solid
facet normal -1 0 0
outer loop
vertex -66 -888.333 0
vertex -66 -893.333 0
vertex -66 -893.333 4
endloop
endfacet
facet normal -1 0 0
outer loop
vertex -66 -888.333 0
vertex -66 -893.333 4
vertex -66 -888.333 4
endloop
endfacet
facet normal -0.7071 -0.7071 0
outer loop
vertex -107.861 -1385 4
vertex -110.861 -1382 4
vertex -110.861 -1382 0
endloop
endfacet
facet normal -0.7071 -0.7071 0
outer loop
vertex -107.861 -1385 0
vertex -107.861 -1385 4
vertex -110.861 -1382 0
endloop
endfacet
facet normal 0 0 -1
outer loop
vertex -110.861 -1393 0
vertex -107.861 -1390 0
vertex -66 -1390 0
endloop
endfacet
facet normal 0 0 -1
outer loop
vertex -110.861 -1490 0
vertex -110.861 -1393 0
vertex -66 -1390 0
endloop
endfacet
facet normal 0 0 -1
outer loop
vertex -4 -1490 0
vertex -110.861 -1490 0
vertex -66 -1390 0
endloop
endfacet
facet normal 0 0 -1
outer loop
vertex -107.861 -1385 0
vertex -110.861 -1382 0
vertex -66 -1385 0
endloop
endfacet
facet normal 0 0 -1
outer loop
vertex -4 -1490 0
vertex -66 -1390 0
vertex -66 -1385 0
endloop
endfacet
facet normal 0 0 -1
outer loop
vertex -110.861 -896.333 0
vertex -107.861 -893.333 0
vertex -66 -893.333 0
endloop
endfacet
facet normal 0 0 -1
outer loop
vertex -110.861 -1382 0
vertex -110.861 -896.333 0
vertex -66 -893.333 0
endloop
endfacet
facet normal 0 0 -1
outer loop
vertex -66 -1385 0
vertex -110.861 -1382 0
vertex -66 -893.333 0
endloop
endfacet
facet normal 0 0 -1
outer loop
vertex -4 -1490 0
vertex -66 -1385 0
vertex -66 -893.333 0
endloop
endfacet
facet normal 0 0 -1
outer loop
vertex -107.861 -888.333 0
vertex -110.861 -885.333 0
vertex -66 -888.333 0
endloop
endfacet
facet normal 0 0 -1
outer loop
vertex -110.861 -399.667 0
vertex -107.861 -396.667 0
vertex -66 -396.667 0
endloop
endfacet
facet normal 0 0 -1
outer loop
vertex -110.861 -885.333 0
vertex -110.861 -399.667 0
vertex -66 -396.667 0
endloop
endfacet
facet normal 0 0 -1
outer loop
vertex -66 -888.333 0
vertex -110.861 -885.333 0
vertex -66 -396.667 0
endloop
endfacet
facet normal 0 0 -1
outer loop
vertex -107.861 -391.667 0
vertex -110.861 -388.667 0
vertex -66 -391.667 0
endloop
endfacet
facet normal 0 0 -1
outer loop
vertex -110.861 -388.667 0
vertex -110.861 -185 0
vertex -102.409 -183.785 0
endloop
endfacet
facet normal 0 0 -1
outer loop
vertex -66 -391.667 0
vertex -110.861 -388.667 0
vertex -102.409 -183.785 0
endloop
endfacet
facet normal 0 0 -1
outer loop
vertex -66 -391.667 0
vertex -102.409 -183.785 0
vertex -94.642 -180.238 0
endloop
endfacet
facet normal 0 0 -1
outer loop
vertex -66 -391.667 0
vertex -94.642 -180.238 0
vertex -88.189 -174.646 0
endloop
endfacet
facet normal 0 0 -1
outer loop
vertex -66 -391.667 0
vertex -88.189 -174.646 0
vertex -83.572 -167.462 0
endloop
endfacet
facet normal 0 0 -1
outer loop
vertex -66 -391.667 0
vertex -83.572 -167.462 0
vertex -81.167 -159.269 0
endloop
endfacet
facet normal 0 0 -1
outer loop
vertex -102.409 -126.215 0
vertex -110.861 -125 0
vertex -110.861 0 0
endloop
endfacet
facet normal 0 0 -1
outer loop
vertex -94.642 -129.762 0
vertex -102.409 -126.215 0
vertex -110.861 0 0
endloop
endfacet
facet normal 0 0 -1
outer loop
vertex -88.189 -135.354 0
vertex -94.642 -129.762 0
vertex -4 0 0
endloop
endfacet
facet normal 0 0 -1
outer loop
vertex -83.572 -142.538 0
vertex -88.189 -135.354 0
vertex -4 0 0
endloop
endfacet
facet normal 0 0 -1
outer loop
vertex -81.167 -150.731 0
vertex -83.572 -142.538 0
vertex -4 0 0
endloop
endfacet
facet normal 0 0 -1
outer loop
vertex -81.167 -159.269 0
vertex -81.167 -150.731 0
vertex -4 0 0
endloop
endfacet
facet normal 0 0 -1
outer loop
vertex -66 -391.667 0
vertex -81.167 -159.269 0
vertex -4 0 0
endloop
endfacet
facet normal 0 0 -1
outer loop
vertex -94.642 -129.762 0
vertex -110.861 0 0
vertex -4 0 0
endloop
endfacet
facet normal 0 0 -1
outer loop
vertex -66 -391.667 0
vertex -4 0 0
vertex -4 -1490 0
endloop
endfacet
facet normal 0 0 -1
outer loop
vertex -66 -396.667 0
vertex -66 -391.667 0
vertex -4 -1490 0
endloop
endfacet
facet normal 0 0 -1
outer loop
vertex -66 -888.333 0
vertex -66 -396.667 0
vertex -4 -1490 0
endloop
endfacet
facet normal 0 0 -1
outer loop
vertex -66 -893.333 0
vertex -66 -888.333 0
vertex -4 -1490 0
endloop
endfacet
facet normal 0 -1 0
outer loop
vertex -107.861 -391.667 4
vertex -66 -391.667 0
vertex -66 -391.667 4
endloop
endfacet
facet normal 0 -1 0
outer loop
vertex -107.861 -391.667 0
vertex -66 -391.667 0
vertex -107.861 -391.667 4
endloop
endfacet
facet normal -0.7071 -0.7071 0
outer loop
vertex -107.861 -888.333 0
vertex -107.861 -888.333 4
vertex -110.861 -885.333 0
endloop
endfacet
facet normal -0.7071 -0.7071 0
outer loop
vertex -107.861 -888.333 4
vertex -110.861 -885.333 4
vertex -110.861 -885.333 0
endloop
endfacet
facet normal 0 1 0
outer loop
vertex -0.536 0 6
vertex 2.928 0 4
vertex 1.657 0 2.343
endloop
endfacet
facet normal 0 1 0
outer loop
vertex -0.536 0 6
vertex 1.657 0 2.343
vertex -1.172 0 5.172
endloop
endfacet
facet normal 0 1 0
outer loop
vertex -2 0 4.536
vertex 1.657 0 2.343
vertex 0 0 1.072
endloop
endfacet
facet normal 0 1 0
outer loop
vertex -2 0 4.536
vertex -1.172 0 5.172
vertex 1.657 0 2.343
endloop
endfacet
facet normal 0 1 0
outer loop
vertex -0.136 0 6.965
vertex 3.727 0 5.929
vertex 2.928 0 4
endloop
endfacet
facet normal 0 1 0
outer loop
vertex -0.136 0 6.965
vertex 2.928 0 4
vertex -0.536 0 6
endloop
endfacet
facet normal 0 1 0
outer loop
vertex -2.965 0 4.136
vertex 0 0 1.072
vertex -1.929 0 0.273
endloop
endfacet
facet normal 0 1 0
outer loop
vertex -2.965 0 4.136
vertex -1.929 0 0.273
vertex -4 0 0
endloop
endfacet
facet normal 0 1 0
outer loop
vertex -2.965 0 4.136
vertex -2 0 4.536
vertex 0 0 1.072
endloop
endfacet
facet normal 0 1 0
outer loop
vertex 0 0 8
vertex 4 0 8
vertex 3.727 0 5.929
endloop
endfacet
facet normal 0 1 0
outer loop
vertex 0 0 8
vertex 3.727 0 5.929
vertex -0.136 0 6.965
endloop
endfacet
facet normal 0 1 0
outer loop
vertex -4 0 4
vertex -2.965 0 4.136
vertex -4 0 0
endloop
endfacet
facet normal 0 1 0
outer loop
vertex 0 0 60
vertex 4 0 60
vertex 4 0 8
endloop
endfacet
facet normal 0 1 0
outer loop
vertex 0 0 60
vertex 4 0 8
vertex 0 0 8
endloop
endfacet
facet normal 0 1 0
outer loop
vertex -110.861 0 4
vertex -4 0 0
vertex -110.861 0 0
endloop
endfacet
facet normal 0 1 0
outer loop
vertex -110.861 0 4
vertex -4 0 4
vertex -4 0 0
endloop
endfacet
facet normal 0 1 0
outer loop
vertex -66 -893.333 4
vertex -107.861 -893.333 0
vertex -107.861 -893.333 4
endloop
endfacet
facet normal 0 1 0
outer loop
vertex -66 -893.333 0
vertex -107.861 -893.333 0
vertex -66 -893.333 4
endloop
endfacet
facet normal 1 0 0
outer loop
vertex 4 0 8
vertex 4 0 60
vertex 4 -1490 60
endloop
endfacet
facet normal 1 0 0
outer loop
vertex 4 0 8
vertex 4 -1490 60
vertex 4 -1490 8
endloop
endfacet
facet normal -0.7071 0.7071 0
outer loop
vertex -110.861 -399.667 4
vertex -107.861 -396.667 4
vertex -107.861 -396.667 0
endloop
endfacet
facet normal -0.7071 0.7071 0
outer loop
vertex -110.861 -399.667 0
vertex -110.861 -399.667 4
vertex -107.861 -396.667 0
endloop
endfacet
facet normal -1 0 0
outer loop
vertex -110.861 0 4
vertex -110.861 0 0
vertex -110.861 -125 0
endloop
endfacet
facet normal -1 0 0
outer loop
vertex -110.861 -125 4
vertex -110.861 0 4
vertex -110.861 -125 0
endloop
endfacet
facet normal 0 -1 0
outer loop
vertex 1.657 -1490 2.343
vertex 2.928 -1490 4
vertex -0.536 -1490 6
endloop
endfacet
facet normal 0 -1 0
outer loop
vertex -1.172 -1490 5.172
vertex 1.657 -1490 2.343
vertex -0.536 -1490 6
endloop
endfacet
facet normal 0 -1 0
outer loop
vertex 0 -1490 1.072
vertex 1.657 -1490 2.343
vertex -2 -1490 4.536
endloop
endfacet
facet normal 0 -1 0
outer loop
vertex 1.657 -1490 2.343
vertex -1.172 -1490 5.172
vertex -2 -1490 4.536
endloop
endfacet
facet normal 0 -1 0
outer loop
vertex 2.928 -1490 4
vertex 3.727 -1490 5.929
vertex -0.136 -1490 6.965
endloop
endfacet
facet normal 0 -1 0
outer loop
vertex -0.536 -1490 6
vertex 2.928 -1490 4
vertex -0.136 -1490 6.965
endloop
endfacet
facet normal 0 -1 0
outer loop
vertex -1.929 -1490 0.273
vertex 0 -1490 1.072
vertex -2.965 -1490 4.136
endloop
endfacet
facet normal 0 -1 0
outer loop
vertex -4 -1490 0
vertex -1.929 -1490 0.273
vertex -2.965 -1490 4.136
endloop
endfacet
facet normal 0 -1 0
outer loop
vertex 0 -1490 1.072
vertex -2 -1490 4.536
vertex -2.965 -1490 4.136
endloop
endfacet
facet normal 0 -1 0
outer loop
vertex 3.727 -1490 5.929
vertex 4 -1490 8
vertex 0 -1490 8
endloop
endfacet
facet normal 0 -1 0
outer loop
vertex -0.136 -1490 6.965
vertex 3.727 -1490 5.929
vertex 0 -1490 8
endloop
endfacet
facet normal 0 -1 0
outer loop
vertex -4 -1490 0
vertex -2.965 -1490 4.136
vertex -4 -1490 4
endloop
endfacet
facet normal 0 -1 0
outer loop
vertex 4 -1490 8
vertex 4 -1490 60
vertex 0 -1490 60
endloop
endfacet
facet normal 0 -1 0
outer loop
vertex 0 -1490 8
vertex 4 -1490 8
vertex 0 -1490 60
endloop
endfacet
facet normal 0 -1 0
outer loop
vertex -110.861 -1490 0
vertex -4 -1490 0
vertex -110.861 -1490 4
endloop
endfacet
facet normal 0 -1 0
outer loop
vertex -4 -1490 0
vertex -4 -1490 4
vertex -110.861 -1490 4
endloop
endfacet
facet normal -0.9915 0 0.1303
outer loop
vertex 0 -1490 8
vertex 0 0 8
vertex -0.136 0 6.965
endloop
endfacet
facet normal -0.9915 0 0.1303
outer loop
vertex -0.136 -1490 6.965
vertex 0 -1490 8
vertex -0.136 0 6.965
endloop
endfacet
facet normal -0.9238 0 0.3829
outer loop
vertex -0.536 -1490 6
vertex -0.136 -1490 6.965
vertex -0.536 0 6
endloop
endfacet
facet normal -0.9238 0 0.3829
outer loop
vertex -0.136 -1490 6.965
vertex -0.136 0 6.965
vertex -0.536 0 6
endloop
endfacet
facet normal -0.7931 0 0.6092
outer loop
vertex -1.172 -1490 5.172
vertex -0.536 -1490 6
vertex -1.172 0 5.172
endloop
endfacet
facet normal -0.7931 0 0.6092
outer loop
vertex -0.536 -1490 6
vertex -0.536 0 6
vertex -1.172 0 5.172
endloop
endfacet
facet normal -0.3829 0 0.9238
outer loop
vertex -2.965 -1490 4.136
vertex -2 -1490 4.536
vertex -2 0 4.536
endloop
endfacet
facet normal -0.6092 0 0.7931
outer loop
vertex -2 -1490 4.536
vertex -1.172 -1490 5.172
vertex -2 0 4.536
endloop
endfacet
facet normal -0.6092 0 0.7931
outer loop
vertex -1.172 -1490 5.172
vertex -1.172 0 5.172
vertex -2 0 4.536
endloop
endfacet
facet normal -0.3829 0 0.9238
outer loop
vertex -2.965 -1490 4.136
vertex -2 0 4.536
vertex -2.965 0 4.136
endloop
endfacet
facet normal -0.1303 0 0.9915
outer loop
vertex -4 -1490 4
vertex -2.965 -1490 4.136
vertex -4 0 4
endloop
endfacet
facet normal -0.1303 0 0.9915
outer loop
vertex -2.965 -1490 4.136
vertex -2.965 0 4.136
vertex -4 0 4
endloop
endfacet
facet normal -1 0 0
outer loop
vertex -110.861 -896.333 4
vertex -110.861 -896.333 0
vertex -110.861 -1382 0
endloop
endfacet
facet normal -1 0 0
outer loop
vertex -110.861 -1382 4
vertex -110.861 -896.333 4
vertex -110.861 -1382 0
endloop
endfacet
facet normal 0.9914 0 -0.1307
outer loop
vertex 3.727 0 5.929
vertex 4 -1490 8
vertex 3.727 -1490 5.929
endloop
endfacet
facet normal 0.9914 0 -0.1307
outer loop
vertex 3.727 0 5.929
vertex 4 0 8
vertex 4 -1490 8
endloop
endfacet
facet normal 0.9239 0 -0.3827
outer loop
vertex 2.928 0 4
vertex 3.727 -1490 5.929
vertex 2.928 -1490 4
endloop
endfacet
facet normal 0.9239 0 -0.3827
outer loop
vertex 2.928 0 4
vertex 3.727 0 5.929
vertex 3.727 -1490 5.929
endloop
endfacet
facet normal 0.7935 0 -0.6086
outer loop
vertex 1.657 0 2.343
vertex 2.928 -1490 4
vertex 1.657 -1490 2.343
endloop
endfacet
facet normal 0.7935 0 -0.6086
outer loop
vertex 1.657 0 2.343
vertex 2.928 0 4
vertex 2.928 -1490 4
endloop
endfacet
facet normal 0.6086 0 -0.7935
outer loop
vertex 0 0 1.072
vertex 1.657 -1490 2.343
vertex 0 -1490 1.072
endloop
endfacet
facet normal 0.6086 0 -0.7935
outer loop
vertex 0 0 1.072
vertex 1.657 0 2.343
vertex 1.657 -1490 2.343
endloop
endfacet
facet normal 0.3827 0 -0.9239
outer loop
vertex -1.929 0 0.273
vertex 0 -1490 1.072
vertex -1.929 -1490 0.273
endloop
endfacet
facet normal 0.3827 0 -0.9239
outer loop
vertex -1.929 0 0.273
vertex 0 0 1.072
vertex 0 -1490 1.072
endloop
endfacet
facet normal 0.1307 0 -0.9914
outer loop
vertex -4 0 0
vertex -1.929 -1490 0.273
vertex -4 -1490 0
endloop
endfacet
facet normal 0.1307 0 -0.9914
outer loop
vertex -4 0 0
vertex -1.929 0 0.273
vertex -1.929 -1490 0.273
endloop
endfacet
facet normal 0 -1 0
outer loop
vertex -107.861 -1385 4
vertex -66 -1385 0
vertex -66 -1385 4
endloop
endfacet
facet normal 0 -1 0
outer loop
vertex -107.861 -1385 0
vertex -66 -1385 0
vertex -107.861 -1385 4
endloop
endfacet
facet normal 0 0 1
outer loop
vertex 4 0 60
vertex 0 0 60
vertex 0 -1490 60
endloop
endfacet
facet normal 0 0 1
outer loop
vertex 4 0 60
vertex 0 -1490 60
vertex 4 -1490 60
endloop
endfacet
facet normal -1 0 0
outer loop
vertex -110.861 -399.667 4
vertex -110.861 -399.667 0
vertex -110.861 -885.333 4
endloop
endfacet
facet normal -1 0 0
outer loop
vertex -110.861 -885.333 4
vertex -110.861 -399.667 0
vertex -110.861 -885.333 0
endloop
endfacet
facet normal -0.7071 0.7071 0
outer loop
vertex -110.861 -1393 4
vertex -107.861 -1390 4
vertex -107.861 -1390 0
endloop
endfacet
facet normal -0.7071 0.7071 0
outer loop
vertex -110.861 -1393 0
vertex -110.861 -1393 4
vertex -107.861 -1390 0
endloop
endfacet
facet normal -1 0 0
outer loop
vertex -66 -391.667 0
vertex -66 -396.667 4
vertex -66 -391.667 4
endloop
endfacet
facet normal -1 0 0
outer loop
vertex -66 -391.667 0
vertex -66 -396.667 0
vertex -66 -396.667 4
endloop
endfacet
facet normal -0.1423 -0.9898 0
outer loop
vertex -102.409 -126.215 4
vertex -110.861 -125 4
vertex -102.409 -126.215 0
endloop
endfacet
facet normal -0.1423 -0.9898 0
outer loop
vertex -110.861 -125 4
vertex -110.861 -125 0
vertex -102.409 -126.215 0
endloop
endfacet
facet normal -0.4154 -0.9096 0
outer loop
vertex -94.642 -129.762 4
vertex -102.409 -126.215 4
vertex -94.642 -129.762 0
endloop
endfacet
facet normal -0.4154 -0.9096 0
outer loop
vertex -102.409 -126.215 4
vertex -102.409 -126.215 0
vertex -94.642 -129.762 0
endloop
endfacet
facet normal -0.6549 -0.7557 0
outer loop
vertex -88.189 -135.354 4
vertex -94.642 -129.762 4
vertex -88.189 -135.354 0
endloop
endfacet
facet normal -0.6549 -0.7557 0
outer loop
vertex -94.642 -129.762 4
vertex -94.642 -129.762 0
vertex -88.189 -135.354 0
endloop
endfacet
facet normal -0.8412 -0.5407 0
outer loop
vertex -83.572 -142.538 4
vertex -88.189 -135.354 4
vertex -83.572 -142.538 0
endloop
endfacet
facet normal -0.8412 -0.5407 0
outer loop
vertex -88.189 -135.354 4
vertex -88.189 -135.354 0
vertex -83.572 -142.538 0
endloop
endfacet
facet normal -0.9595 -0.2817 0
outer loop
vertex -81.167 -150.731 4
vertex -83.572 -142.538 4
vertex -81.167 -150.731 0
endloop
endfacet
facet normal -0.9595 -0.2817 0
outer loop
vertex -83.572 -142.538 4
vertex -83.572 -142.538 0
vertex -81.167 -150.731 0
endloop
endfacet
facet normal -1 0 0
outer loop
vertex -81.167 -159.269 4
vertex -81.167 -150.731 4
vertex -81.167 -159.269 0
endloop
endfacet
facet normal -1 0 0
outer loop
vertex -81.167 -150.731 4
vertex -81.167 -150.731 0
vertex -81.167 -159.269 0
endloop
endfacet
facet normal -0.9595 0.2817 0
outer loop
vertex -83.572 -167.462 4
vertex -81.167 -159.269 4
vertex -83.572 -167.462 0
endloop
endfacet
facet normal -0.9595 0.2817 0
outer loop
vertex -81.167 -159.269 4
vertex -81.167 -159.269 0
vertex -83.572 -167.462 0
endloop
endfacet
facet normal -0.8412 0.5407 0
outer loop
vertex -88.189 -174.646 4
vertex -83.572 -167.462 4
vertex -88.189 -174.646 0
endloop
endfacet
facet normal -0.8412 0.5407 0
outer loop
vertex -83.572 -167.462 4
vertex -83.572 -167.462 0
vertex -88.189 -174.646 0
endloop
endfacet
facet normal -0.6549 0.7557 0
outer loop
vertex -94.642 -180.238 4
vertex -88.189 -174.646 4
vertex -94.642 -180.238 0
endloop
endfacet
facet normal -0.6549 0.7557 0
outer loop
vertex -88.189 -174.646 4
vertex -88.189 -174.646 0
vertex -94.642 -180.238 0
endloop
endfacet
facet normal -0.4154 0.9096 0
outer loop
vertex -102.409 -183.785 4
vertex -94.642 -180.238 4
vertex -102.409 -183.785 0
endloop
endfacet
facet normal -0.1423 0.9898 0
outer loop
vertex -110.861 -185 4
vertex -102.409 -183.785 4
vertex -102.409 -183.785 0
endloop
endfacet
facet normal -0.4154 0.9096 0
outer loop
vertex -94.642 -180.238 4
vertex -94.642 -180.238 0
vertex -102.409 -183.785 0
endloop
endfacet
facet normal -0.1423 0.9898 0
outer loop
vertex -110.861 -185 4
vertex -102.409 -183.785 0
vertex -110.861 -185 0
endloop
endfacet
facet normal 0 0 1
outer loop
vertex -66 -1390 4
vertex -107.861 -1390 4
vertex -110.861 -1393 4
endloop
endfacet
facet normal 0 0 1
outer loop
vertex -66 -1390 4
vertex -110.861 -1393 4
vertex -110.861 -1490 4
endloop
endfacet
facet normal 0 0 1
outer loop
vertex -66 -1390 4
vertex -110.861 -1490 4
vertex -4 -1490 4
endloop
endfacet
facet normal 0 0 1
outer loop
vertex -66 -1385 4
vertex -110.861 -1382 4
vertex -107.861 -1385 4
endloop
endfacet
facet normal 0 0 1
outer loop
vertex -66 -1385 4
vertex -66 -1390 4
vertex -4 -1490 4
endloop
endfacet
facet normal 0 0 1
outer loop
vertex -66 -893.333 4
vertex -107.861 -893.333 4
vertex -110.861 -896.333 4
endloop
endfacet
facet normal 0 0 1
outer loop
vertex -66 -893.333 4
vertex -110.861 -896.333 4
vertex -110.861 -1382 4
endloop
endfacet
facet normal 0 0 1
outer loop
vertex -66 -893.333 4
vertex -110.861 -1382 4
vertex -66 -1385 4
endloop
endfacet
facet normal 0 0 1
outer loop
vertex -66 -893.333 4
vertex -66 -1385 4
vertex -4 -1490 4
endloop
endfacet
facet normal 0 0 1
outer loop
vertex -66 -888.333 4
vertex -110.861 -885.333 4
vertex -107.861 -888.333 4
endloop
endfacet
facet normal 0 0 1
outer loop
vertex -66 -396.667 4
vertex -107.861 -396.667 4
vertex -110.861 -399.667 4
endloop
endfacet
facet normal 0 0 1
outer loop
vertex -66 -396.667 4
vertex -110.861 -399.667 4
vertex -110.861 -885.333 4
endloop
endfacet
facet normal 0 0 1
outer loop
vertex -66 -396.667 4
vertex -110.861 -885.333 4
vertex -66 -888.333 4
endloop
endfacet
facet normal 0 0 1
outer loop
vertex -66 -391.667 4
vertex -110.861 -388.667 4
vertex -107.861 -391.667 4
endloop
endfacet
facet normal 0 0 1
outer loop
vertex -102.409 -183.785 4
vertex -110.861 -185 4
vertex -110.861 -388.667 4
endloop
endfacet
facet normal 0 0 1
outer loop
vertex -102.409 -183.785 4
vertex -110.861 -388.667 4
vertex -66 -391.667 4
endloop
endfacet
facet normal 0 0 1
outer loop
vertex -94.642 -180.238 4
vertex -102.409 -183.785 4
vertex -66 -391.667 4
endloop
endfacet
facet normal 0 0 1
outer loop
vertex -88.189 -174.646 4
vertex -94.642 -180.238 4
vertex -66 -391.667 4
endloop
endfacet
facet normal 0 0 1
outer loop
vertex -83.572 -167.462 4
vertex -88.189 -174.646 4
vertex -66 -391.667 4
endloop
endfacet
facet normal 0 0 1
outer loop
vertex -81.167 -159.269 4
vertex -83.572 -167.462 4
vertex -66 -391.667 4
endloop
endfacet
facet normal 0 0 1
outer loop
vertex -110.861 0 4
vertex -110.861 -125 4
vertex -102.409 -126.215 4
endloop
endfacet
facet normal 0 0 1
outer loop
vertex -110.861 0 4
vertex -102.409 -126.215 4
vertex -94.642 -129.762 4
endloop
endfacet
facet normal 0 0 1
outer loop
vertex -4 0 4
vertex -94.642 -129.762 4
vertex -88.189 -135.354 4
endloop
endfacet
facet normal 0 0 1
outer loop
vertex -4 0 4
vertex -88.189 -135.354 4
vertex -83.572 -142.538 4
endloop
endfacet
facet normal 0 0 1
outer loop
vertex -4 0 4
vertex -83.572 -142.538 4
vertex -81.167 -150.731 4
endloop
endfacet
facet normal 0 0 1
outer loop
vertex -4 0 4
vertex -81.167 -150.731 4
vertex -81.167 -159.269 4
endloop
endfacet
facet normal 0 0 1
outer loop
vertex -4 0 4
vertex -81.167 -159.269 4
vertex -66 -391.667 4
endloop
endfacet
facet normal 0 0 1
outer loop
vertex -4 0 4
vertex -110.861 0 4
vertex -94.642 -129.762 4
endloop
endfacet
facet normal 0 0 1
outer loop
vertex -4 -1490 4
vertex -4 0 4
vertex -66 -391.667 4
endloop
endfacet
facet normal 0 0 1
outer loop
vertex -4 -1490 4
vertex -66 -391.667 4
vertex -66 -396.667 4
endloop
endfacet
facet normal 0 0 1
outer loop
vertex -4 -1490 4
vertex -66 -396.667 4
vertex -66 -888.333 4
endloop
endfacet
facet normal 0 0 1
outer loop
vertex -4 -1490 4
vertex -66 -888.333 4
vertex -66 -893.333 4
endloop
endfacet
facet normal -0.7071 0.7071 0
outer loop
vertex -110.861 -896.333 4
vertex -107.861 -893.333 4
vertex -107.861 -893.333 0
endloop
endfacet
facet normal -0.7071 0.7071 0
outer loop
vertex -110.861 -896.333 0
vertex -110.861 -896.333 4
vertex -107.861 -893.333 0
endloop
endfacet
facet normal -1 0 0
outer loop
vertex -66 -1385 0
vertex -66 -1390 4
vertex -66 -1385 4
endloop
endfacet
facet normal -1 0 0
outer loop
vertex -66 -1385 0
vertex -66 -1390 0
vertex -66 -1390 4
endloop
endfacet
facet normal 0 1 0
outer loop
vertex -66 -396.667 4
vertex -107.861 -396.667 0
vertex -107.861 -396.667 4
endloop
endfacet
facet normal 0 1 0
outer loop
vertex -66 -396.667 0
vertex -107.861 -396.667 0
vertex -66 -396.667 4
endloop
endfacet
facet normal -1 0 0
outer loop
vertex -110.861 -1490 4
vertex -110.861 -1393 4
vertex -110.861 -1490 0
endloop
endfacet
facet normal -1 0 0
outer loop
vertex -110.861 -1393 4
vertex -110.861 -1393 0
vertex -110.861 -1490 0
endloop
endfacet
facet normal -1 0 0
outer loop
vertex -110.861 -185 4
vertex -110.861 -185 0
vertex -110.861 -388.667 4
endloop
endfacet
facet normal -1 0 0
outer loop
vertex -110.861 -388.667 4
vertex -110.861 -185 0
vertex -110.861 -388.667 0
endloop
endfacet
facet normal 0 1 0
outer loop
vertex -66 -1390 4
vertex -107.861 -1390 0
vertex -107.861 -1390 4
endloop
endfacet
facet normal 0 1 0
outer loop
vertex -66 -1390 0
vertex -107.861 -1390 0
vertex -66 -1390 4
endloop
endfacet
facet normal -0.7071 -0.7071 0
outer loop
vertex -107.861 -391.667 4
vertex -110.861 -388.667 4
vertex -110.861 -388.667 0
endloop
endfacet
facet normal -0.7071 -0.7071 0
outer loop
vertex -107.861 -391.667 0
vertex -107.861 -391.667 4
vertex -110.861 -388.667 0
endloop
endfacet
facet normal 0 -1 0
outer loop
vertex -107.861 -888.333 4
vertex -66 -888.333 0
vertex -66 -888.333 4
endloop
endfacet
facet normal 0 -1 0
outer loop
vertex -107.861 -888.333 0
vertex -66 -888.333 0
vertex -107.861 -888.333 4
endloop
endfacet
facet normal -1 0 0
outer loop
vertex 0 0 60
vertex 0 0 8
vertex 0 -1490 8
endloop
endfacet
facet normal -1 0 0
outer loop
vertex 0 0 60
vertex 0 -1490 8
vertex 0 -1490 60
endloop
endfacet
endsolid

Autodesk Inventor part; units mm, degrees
ref_plane "YZ Plane" through (0, 0, 0) normal (1, 0, 0) x (0, 1, 0)
ref_plane "XZ Plane" through (0, 0, 0) normal (0, 1, 0) x (-1, 0, 0)
ref_plane "XY Plane" through (0, 0, 0) normal (0, 0, 1) x (1, 0, 0)
sketch "Sketch1" plane through (0, 0, 0) normal (0, 0, 1) x (1, 0, 0)
  line L0 (0, 0) -> (-110.8614, 0)
  line L1 (-110.8614, 0) -> (-110.8614, -1490)
  line L2 (-110.8614, -1490) -> (0, -1490)
  line L3 (0, -1490) -> (0, 0)
  line L4 (-110.8614, -1390) -> (-66, -1390)
  line L5 (-66, -1390) -> (-66, -1385)
  line L6 (-66, -1385) -> (-110.8614, -1385)
  line L7 (-110.8614, -1385) -> (-110.8614, -1390)
  line L8 (-110.8614, -893.3333) -> (-66, -893.3333)
  line L9 (-66, -893.3333) -> (-66, -888.3333)
  line L10 (-66, -888.3333) -> (-110.8614, -888.3333)
  line L11 (-110.8614, -888.3333) -> (-110.8614, -893.3333)
  line L12 (-110.8614, -396.6667) -> (-66, -396.6667)
  line L13 (-66, -396.6667) -> (-66, -391.6667)
  line L14 (-66, -391.6667) -> (-110.8614, -391.6667)
  line L15 (-110.8614, -391.6667) -> (-110.8614, -396.6667)
  circle A0 centre (-110.8614, -155) radius 30
  point P0 (-110.8614, -1385)
  point P1 (-110.8614, -125)
  point P2 (-110.8614, -185)
  dimension "d0" = 1490
  dimension "d1" = 110.8614
  dimension "d2" = 5
  dimension "d4" = 100
  dimension "d7" = 496.6667
  dimension "d23" = 66
  dimension "d28" = 60
  dimension "d29" = 1335
extrude "Plate1" add sketch "Sketch1" along normal blind 4 contours L3 L2 L1 L4 L5 L6 L8 L9 L10 L12 L13 L14 A0 L0
sketch "Sketch2" plane through (4, 0, 0) normal (-1, 0, 0) x (0, -1, 0)
  line L0 (1490, 0) -> (0, 0)
  line L1 (0, 0) -> (0, 60)
  line L2 (0, 60) -> (1490, 60)
  line L3 (1490, 60) -> (1490, 0)
edge flange "Flange1" height 60 angle 90 thickness 4 bend radius 4 thickness toward (-1, 0, 0) relief tear relief width 4 relief depth 2 edges at (0, -745, 4) wall of the first edge with corners at (4, -1490, 0) (4, 0, 0) (4, 0, 60) (4, -1490, 60)
bend "Bend1"
corner "Corner1"
chamfer "Corner Chamfer1" distance 3 angle 45 6 edges at (-110.8614, -1390, 2) (-110.8614, -1385, 2) (-110.8614, -893.3333, 2) (-110.8614, -888.3333, 2) (-110.8614, -391.6667, 2) (-110.8614, -396.6667, 2)
equation "\"d0\" = Стрингер_длина"
equation "\"d1\" = стрингер_глубина_8"
equation "\"d2\" = паз_под_стрингер_толщина"
equation "\"d7\" = 0.333333 * Стрингер_длина"
equation "\"d23\" = паз_под_стрингер_глубина - Thickness"
equation "\"d28\" = 2 * радиус_выреза_под_сварку"
equation "\"d12\" = Thickness"
equation "\"d13\" = BendReliefWidth"
equation "\"d14\" = BendReliefDepth"
equation "\"d15\" = MinimumRemnant"
equation "\"d16\" = TransitionRadius"
equation "\"d17\" = ребро_усилителей"
equation "\"d19\" = BendRadius"
equation "\"d20\" = CornerReliefSize"
equation "\"d21\" = GapSize"
equation "\"d22\" = JacobiRadiusSize"
equation "\"BendRadius\" = Thickness"
equation "\"BendReliefWidth\" = Thickness"
equation "\"BendReliefDepth\" = 0.5 * Thickness"
equation "\"CornerReliefSize\" = 4 * Thickness"
equation "\"MinimumRemnant\" = 2 * Thickness"
equation "\"TransitionRadius\" = BendRadius"
equation "\"JacobiRadiusSize\" = BendRadius"
equation "\"GapSize\" = Thickness"
equation "\"Стрингер_длина\" = 1490"
equation "\"стрингер_глубина_8\" = 110.861434"
equation "\"паз_под_стрингер_толщина\" = 5"
equation "\"паз_под_стрингер_глубина\" = 70"
equation "\"Thickness\" = 4"
equation "\"радиус_выреза_под_сварку\" = 30"
equation "\"ребро_усилителей\" = 60"
properties part number "0382 GBK stringer 8" material "Steel"
